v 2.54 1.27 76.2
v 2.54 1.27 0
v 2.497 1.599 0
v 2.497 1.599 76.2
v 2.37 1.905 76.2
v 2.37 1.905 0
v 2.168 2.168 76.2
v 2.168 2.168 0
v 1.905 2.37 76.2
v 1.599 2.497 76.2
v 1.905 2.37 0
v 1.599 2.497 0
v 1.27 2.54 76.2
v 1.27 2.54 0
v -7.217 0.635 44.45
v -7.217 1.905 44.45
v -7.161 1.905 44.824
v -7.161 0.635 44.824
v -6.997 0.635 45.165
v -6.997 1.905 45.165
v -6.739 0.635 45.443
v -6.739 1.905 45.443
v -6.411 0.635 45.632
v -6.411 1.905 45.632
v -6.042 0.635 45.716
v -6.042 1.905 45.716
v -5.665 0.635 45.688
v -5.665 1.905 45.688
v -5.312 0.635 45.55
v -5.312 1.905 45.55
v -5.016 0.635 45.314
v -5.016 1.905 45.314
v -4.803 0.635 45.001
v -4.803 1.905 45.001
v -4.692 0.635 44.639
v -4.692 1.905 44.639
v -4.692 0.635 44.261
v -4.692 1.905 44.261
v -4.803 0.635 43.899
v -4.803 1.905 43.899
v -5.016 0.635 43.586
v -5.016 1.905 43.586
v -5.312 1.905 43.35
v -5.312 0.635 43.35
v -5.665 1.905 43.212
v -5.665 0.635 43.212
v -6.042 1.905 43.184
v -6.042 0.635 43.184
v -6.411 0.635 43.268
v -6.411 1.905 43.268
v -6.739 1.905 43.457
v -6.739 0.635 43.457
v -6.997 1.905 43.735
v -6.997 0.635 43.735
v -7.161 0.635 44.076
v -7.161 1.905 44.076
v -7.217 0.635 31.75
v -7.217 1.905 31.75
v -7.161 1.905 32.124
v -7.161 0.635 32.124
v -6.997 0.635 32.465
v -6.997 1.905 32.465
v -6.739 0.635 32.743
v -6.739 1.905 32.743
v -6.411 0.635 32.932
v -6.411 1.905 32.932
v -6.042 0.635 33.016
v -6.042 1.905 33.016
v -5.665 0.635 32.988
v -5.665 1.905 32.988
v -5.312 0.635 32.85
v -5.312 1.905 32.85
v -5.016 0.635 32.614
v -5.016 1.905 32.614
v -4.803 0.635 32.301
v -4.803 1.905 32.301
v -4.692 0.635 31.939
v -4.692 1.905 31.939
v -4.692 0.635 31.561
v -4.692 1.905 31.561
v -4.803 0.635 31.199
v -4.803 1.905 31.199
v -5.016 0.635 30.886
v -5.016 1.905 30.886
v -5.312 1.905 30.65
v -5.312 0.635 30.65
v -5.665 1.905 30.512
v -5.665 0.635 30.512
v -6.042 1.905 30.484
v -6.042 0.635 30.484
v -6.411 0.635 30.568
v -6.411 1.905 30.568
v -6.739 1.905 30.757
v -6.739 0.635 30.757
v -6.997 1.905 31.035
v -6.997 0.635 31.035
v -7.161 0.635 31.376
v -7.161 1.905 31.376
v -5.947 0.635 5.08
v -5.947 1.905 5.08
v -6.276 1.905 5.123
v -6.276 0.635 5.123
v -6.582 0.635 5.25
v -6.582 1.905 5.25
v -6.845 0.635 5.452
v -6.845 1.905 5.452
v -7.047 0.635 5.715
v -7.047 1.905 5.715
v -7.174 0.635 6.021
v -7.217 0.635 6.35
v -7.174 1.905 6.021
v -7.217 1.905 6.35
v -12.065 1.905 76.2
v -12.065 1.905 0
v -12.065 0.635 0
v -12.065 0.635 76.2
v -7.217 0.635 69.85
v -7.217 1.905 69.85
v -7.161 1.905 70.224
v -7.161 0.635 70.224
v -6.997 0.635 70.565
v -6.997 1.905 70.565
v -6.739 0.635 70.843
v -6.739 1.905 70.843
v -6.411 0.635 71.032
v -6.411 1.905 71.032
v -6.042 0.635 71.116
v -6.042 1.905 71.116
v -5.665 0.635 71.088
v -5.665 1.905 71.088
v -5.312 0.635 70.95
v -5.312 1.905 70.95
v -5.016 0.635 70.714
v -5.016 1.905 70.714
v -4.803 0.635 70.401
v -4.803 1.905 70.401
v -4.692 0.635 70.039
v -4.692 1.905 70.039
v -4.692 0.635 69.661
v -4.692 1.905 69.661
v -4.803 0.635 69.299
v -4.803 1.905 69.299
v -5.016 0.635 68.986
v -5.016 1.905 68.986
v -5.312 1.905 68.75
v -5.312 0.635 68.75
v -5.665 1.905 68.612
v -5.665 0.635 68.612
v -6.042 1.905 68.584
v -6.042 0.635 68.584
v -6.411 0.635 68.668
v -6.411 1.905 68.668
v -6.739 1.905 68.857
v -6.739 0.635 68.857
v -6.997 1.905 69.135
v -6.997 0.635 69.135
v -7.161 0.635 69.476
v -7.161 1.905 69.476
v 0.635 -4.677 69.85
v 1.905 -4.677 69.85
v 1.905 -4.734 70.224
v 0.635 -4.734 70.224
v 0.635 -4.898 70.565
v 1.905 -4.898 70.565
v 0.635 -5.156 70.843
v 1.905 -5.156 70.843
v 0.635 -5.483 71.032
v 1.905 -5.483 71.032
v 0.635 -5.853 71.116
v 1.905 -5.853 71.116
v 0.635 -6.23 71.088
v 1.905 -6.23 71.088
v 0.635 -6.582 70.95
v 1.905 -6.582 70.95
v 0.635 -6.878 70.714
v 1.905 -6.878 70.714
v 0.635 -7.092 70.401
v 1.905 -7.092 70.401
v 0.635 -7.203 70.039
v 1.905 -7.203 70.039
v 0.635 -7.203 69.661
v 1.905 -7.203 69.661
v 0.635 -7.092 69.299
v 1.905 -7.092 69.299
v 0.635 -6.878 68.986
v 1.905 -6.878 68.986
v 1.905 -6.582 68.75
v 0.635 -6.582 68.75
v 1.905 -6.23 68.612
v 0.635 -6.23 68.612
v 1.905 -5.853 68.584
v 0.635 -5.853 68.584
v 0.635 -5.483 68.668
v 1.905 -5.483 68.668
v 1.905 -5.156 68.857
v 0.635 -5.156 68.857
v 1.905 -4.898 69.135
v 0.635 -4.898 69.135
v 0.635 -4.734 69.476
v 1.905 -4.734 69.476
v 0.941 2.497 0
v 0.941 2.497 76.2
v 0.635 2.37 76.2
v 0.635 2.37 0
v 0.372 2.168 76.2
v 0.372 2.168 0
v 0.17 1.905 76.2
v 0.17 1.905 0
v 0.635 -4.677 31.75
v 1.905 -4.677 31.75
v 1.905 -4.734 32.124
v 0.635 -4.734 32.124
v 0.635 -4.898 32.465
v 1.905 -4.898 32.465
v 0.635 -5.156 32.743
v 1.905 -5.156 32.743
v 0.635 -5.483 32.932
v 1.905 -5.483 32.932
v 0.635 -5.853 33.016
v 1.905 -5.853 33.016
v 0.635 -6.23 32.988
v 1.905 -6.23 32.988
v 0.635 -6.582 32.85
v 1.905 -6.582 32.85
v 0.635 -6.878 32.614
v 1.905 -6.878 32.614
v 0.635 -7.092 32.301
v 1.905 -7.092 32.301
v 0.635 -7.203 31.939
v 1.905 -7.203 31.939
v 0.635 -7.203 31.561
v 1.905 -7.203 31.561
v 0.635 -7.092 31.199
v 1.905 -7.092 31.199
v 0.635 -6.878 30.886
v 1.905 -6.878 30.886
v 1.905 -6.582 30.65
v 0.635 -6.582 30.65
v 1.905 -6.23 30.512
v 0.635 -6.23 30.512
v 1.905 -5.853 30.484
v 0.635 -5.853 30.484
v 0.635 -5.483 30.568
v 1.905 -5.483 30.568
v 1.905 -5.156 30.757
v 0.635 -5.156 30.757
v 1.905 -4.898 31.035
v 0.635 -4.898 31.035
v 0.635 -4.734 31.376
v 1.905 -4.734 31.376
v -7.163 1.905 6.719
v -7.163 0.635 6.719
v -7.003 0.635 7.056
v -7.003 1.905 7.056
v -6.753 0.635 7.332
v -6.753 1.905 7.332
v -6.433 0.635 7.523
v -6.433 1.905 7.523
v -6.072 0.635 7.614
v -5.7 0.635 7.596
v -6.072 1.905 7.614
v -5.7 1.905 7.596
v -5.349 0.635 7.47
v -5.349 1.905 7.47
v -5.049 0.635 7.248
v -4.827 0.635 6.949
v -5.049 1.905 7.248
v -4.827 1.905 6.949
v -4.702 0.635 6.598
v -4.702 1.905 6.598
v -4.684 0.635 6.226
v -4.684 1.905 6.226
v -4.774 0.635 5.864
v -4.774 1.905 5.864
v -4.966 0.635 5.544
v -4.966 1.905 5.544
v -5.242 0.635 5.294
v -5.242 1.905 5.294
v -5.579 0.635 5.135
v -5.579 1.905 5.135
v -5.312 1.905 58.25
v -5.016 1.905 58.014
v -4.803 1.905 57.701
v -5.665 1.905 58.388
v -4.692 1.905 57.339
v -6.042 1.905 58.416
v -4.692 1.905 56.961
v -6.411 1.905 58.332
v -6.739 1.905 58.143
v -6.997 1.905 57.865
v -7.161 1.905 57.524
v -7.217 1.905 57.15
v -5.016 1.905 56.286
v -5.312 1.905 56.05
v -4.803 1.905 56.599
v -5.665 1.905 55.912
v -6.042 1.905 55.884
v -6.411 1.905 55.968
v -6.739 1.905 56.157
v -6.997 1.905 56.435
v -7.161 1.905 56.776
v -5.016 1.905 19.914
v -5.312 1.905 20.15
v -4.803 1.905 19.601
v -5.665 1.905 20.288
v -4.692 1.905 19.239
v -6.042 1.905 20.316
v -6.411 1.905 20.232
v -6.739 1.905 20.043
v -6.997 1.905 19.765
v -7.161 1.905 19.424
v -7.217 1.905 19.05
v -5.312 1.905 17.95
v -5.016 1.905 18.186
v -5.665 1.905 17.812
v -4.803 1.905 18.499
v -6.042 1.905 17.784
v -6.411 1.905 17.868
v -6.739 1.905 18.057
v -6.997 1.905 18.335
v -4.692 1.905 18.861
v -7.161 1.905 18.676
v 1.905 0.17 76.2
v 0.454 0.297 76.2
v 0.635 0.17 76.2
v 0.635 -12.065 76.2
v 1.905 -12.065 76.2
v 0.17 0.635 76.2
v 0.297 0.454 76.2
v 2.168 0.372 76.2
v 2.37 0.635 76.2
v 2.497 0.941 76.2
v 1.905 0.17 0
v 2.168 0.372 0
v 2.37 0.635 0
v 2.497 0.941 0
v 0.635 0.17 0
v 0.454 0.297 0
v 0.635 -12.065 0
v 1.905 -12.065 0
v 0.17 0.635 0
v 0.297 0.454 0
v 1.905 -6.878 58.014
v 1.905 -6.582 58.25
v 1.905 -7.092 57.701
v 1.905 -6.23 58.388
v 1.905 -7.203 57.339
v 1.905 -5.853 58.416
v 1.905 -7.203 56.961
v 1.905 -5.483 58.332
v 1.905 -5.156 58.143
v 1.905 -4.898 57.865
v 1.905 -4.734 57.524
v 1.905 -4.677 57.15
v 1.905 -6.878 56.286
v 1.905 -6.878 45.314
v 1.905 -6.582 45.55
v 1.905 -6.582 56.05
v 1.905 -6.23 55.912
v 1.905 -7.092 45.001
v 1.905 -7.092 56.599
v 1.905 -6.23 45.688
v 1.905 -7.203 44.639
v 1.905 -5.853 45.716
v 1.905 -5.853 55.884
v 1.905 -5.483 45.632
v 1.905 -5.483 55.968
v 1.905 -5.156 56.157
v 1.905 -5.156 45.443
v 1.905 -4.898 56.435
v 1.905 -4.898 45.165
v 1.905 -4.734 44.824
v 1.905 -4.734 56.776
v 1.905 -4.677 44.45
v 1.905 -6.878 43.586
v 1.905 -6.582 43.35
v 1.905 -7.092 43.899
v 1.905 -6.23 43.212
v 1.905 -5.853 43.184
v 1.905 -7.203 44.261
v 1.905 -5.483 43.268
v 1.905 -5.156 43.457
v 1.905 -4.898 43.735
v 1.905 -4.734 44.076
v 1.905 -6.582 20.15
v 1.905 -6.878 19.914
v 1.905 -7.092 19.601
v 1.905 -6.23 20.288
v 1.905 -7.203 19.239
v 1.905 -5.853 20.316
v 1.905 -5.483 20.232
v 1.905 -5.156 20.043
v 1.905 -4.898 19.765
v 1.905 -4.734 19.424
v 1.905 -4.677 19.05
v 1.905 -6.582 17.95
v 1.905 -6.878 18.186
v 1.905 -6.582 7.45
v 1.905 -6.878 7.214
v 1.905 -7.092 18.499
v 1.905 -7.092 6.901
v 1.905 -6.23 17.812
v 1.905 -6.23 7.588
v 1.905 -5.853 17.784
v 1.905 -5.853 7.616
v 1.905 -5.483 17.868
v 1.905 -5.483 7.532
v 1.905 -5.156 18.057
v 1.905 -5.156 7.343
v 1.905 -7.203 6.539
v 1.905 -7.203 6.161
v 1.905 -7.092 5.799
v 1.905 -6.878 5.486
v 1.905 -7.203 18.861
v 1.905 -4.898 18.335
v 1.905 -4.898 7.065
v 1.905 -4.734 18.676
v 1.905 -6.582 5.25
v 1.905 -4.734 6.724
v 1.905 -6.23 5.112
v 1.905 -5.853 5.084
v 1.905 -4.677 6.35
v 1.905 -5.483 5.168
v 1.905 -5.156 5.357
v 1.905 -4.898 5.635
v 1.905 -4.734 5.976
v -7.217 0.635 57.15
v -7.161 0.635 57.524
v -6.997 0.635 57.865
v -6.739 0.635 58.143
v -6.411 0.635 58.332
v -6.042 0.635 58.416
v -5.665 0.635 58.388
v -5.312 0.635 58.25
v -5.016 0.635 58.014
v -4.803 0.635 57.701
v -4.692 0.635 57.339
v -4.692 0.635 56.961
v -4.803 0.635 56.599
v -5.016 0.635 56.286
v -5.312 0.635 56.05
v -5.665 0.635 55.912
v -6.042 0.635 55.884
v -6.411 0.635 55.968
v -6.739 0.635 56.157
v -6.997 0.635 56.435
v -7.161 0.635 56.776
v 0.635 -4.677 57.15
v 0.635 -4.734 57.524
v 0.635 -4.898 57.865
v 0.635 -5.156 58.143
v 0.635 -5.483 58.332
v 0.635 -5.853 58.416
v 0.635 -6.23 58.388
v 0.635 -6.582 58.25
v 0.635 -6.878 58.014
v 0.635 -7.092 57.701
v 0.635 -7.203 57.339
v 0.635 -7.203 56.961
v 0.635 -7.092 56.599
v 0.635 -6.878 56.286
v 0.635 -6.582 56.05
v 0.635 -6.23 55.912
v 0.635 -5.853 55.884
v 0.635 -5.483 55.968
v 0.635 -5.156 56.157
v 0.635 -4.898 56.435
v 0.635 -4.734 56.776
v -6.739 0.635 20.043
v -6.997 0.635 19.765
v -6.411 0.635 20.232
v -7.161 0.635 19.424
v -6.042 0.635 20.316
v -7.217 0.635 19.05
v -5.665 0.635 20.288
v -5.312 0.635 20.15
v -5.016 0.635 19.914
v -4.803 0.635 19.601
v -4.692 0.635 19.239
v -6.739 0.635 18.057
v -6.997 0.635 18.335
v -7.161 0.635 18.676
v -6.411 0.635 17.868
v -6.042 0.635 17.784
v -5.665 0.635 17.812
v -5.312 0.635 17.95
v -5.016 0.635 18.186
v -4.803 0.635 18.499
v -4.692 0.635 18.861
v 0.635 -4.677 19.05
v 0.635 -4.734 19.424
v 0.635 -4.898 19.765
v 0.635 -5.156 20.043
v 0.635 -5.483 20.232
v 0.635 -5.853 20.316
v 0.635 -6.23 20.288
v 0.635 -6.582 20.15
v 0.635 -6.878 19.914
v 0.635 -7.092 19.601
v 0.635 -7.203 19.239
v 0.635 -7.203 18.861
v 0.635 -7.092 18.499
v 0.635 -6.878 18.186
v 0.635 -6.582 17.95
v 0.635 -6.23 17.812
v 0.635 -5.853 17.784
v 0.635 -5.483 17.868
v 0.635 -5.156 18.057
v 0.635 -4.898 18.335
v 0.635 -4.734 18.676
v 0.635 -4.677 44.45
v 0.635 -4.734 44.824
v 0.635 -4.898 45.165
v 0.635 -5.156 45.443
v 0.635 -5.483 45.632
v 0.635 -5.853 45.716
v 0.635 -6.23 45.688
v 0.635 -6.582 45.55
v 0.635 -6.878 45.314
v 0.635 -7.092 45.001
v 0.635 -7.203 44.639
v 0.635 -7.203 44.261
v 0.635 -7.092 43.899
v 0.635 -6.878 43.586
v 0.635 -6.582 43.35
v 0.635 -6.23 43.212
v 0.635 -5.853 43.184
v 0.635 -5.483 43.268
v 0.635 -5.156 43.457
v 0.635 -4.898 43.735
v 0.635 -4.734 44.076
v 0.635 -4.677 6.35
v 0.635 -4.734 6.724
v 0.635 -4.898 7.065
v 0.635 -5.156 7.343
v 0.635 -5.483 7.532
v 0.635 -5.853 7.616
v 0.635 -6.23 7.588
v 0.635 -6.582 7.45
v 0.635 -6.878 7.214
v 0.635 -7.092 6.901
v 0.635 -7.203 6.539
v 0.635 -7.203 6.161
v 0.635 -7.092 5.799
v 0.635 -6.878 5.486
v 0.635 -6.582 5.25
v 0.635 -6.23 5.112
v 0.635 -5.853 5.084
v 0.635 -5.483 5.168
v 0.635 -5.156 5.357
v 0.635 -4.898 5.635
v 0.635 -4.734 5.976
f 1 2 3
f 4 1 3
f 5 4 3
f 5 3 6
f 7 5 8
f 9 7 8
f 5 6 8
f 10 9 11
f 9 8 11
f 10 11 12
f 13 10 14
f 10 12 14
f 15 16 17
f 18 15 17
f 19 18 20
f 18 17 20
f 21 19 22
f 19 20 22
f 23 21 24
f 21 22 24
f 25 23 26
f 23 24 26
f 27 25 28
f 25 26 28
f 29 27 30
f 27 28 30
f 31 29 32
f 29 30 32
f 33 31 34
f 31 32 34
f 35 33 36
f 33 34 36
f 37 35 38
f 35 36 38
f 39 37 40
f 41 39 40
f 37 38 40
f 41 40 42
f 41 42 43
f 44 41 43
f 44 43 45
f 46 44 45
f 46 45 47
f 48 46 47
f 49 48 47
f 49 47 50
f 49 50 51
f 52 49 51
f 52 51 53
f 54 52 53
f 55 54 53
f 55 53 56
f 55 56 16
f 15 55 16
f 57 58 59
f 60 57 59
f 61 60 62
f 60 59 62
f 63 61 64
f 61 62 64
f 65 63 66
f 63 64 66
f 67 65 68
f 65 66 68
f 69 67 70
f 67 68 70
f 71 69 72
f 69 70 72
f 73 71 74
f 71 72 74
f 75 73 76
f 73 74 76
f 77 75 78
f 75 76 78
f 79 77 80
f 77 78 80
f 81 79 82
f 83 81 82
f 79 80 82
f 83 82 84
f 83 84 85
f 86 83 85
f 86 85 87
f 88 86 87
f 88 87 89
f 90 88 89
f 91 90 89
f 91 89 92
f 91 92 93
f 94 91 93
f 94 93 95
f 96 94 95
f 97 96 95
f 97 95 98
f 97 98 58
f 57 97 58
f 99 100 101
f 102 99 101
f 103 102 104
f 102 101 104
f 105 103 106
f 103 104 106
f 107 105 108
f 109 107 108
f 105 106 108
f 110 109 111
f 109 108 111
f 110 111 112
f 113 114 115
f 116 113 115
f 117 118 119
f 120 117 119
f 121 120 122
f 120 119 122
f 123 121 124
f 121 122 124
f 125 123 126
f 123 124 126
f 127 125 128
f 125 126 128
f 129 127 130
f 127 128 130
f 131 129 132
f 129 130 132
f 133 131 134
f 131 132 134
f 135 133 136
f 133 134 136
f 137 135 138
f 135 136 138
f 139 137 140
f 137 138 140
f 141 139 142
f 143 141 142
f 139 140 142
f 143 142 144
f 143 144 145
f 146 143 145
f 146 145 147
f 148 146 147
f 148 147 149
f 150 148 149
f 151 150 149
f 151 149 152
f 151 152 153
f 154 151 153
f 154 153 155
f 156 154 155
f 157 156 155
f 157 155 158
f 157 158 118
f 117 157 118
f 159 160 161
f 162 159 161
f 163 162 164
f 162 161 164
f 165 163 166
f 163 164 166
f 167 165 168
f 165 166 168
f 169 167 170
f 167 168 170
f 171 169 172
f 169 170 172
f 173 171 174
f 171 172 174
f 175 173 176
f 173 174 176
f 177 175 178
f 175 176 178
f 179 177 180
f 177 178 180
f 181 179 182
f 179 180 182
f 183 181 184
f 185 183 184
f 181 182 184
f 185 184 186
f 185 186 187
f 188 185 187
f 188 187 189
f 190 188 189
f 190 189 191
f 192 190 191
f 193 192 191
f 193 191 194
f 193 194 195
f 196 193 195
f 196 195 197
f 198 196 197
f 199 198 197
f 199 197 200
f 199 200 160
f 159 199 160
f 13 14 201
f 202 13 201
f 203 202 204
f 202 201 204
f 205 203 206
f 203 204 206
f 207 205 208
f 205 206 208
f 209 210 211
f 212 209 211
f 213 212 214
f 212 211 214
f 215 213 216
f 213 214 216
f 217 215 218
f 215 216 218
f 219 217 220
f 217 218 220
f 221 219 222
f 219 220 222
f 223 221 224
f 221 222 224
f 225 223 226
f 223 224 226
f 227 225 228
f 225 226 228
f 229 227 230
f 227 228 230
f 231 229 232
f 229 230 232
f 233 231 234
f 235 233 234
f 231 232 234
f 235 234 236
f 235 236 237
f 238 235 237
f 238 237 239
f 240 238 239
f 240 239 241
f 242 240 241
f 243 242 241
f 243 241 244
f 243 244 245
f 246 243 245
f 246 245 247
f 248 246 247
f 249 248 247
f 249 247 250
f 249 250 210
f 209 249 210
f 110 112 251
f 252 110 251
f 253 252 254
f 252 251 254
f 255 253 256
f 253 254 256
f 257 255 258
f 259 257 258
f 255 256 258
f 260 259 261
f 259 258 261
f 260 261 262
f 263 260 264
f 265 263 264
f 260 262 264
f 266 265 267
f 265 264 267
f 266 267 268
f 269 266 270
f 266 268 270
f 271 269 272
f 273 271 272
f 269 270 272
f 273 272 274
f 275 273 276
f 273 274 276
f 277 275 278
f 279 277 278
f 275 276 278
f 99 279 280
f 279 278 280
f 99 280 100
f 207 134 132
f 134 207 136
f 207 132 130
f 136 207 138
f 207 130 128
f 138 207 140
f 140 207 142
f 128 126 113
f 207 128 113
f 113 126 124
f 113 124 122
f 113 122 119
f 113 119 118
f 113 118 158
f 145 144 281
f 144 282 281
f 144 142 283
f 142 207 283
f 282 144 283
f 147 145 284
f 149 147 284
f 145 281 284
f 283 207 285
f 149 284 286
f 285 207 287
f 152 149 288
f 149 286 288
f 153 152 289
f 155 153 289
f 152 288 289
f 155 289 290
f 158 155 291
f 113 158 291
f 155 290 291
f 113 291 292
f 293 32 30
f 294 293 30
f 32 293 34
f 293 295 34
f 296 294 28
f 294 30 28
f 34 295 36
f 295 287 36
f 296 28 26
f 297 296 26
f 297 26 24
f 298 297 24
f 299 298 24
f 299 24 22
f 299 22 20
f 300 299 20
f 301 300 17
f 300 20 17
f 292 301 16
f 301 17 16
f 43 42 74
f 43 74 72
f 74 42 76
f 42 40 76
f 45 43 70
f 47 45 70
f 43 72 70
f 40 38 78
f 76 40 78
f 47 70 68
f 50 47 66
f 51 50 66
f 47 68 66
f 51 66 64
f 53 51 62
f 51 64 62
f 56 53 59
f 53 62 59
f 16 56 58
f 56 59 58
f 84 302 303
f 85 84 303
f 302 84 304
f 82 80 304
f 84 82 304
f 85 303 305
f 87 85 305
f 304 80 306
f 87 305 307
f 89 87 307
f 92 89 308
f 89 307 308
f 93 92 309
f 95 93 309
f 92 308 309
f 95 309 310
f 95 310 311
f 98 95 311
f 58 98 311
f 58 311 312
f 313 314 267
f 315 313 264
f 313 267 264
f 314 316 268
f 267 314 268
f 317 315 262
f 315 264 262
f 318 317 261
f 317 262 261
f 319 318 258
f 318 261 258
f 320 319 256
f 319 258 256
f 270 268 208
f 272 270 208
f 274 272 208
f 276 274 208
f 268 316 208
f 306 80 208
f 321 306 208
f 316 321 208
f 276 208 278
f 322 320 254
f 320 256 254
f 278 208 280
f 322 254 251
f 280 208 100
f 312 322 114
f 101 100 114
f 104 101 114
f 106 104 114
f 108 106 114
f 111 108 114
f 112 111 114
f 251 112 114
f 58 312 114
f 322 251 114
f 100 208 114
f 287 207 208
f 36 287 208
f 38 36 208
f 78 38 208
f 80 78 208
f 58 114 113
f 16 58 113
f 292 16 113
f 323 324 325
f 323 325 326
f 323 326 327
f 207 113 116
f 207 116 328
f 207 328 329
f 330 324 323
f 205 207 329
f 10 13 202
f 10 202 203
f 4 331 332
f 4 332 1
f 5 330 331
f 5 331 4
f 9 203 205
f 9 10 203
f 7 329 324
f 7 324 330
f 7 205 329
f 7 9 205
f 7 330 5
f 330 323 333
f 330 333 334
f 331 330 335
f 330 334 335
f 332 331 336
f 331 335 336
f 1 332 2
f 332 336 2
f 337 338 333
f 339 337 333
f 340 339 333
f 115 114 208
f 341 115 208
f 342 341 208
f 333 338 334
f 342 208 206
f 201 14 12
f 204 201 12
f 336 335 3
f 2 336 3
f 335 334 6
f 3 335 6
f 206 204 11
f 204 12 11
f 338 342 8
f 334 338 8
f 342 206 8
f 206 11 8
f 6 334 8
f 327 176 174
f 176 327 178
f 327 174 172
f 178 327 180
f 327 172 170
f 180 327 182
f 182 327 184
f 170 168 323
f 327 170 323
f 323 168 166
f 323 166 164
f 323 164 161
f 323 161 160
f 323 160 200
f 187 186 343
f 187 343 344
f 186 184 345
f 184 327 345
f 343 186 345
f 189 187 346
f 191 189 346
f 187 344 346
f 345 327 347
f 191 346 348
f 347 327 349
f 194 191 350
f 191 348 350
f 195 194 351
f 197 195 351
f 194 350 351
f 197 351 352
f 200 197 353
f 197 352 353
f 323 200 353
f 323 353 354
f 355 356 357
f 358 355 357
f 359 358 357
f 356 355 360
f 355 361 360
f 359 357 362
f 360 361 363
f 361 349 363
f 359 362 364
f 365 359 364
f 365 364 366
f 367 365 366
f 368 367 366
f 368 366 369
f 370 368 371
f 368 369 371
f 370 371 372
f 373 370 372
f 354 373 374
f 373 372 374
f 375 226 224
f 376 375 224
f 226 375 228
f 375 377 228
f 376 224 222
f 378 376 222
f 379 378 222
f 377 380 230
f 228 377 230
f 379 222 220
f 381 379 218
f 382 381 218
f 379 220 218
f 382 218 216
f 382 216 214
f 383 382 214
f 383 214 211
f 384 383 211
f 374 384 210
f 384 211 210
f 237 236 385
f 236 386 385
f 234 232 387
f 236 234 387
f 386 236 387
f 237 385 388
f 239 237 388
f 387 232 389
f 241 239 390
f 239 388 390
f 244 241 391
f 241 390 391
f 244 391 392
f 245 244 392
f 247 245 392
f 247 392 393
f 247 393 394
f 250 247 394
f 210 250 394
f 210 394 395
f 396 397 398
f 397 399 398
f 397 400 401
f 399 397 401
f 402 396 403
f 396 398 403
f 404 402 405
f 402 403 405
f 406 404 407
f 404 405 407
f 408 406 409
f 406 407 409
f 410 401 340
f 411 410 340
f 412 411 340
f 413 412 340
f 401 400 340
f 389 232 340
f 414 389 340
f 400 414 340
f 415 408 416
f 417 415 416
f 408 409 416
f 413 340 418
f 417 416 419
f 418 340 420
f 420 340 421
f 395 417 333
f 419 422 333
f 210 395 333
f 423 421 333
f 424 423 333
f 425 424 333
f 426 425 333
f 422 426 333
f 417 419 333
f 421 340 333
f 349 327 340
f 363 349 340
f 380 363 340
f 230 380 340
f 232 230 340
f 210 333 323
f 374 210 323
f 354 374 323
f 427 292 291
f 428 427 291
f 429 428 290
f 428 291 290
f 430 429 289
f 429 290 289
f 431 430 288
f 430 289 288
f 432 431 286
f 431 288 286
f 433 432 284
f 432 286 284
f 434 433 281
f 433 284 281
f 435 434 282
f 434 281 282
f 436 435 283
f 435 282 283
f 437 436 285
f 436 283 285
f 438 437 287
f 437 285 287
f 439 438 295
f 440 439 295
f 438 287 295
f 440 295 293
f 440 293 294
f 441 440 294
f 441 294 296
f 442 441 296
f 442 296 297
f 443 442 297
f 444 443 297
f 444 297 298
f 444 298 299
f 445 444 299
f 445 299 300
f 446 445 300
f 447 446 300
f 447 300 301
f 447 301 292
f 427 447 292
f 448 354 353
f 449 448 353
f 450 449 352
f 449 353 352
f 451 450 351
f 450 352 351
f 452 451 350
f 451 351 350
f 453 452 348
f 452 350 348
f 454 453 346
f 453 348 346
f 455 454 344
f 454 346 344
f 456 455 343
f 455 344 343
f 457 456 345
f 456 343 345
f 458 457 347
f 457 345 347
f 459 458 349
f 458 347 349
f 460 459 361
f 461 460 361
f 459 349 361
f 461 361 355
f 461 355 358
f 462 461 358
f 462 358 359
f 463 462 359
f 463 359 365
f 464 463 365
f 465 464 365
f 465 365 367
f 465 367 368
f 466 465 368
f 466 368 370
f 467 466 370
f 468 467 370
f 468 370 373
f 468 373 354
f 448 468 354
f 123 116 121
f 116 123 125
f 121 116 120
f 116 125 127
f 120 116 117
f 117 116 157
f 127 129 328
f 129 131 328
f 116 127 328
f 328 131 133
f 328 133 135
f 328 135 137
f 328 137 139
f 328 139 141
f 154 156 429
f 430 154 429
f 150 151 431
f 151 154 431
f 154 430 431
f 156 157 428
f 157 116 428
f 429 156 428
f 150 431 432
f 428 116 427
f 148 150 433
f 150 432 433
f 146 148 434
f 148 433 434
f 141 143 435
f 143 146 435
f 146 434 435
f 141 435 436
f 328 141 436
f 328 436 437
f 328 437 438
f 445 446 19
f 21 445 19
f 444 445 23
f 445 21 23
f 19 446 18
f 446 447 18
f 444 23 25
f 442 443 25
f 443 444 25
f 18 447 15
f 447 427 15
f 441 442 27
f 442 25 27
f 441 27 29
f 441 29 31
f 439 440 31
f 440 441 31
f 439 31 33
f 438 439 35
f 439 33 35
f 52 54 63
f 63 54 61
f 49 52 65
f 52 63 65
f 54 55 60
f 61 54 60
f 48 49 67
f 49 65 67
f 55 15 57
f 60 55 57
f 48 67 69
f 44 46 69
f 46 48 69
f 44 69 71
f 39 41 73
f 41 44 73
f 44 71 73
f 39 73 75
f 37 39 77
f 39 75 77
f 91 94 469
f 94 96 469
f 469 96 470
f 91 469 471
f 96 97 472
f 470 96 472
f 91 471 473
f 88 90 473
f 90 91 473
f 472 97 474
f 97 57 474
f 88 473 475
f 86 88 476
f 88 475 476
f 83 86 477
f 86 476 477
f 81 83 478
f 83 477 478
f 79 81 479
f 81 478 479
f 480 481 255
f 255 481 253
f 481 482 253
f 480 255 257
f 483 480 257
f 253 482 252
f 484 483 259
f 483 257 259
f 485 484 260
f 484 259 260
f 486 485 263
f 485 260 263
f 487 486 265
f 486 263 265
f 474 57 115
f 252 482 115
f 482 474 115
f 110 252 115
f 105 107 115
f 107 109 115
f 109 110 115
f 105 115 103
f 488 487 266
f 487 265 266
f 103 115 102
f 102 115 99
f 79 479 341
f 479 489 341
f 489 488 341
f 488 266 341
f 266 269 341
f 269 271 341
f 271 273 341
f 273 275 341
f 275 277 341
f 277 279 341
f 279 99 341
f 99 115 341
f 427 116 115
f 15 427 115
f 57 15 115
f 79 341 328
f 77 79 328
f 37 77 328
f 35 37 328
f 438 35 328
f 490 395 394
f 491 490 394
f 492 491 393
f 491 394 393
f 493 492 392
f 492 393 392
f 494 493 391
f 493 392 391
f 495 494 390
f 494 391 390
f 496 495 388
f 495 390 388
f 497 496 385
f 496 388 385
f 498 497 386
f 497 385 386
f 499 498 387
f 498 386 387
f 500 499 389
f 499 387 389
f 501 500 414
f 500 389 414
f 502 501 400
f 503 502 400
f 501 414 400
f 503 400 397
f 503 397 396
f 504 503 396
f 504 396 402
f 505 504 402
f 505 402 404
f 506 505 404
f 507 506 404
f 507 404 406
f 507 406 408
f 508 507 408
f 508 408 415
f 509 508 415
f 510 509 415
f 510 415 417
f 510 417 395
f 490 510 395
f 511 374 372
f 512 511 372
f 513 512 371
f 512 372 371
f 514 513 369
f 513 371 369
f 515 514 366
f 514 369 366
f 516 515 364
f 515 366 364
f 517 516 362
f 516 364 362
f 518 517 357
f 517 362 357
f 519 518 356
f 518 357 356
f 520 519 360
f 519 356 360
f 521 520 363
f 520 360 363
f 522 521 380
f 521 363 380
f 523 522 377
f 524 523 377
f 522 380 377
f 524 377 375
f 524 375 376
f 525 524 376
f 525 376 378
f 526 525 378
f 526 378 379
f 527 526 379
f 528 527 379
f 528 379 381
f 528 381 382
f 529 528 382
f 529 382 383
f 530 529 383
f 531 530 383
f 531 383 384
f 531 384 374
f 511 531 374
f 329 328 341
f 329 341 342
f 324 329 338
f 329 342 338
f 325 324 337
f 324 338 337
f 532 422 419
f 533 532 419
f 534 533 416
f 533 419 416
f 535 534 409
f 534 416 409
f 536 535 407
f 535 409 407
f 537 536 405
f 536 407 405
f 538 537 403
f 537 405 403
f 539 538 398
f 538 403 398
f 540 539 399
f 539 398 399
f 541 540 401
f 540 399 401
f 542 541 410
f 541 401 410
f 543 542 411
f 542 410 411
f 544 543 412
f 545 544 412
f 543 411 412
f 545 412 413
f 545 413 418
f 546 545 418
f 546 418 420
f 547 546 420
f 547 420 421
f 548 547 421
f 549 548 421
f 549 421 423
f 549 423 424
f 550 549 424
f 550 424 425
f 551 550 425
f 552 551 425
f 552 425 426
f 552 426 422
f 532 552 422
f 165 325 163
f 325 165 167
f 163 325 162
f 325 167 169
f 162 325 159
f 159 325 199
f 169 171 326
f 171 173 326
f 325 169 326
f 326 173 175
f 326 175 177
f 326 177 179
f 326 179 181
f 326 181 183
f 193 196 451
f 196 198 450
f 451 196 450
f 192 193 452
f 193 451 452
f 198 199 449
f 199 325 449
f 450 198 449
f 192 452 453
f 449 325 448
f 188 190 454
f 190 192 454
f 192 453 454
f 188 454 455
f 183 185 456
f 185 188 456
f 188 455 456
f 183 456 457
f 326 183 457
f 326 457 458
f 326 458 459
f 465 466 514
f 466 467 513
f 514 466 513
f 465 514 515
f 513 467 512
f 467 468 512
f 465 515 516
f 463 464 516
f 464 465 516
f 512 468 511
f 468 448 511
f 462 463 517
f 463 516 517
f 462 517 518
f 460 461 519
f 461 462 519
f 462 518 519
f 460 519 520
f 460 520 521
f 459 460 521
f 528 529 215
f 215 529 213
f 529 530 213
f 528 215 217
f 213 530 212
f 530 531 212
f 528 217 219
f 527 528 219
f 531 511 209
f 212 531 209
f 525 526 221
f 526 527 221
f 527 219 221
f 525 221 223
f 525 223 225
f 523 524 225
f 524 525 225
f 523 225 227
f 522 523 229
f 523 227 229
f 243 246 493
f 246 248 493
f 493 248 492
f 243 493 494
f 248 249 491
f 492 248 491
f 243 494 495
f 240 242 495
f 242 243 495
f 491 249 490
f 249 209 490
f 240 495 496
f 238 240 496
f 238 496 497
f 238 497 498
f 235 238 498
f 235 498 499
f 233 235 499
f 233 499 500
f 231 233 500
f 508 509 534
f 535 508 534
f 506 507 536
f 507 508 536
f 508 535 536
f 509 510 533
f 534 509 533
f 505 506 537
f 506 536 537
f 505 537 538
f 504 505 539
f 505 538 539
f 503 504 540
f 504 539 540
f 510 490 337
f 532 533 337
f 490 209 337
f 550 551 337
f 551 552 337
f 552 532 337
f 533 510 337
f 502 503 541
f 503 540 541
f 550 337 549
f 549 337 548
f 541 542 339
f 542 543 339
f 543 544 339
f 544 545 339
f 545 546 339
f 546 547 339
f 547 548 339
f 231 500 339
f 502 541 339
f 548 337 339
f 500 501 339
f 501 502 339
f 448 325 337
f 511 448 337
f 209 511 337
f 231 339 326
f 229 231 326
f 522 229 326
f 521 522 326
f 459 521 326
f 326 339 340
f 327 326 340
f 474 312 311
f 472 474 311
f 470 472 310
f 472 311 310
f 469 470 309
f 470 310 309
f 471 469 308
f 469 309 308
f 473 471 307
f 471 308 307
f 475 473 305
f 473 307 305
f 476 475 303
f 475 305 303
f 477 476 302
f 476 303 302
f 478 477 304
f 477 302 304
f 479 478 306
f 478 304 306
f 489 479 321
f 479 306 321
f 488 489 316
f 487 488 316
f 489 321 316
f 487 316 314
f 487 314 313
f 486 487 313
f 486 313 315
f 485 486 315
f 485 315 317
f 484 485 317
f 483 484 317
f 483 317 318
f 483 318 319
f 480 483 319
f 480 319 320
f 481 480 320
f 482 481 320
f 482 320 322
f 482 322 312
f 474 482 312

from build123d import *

# Parameters (mm, degrees)
F1_DEPTH = 76.2
F2_R     = 1.27
F3_DEPTH = 25.4
F4_R     = 1.27
F5_DEPTH = 25.4


with BuildPart() as f1:
    # F0 (on Top) → F1 (new body)
    with BuildSketch(Plane.XY):
        with BuildLine():
            ThreePointArc((0, 1.27), (0.0432742006, 1.5987001873), (0.1701477372, 1.905))
            Line((0.1701477372, 1.905), (-12.065, 1.905))
            Line((-12.065, 1.905), (-12.065, 0.635))
            Line((-12.065, 0.635), (0.1701477372, 0.635))
            ThreePointArc((0.1701477372, 0.635), (0.0432742006, 0.9412998127), (0, 1.27))
        make_face()
        with BuildLine():
            Line((1.905, -12.065), (1.905, 0.1701477372))
            ThreePointArc((1.905, 0.1701477372), (1.5987001873, 0.0432742006), (1.27, 0))
            ThreePointArc((1.27, 0), (0.9412998127, 0.0432742006), (0.635, 0.1701477372))
            Line((0.635, 0.1701477372), (0.635, -12.065))
            Line((0.635, -12.065), (1.905, -12.065))
        make_face()
        with BuildLine():
            ThreePointArc((1.905, 0.1701477372), (2.3698522628, 0.635), (2.54, 1.27))
            Line((2.54, 1.27), (1.905, 0.635))
            Line((1.905, 0.635), (1.905, 0.1701477372))
        make_face()
        with BuildLine():
            Line((1.27, 2.54), (2.54, 1.27))
            ThreePointArc((2.54, 1.27), (2.1680256121, 2.1680256121), (1.27, 2.54))
        make_face()
        Polygon((1.27, 1.27), (2.54, 1.27), (1.27, 2.54), align=None)
        Polygon((1.905, 0.635), (2.54, 1.27), (1.27, 1.27), (1.27, 0), align=None)
        with BuildLine():
            ThreePointArc((1.27, 0), (1.5987001873, 0.0432742006), (1.905, 0.1701477372))
            Line((1.905, 0.1701477372), (1.905, 0.635))
            Line((1.905, 0.635), (1.27, 0))
        make_face()
        with BuildLine():
            ThreePointArc((0.635, 0.1701477372), (0.9412998127, 0.0432742006), (1.27, 0))
            Line((1.27, 0), (0.635, 0.635))
            Line((0.635, 0.635), (0.635, 0.1701477372))
        make_face()
        with BuildLine():
            ThreePointArc((0.1701477372, 0.635), (0.3719743879, 0.3719743879), (0.635, 0.1701477372))
            Line((0.635, 0.1701477372), (0.635, 0.635))
            Line((0.635, 0.635), (0.1701477372, 0.635))
        make_face()
        with BuildLine():
            Line((0.635, 0.635), (0, 1.27))
            ThreePointArc((0, 1.27), (0.0432742006, 0.9412998127), (0.1701477372, 0.635))
            Line((0.1701477372, 0.635), (0.635, 0.635))
        make_face()
        Polygon((1.27, 0), (1.27, 1.27), (0, 1.27), (0.635, 0.635), align=None)
        Polygon((1.27, 1.27), (1.27, 2.54), (0.635, 1.905), (0, 1.27), align=None)
        with BuildLine():
            Line((0.635, 1.905), (0.1701477372, 1.905))
            ThreePointArc((0.1701477372, 1.905), (0.0432742006, 1.5987001873), (0, 1.27))
            Line((0, 1.27), (0.635, 1.905))
        make_face()
        with BuildLine():
            Line((0.635, 1.905), (1.27, 2.54))
            ThreePointArc((1.27, 2.54), (0.635, 2.3698522628), (0.1701477372, 1.905))
            Line((0.1701477372, 1.905), (0.635, 1.905))
        make_face()
    extrude(amount=F1_DEPTH)

    # F2 (on face) → F3 (cut)
    with BuildSketch(Plane.YZ.offset(1.905)):
        with Locations((-5.9474261314, 69.85)):
            Circle(F2_R)
        with Locations((-5.9474261314, 57.15)):
            Circle(F2_R)
        with Locations((-5.9474261314, 44.45)):
            Circle(F2_R)
        with Locations((-5.9474261314, 31.75)):
            Circle(F2_R)
        with Locations((-5.9474261314, 19.05)):
            Circle(F2_R)
        with Locations((-5.9474261314, 6.35)):
            Circle(F2_R)
    extrude(amount=-F3_DEPTH, mode=Mode.SUBTRACT)

    # F4 (on face) → F5 (cut)
    with BuildSketch(Plane(origin=(0, 1.905, 0), x_dir=(-1, 0, 0), z_dir=(0, 1, 0))):
        with Locations((5.9474261314, 69.85)):
            Circle(F4_R)
        with Locations((5.9474261314, 57.15)):
            Circle(F4_R)
        with Locations((5.9474261314, 44.45)):
            Circle(F4_R)
        with Locations((5.9474261314, 31.75)):
            Circle(F4_R)
        with Locations((5.9474261314, 19.05)):
            Circle(F4_R)
        with BuildLine():
            ThreePointArc((7.2174261314, 6.35), (5.0494005193, 7.2480256121), (5.9474261314, 5.08))
            ThreePointArc((5.9474261314, 5.08), (6.8454517435, 5.4519743879), (7.2174261314, 6.35))
        make_face()
    extrude(amount=-F5_DEPTH, mode=Mode.SUBTRACT)


solid = f1.part
